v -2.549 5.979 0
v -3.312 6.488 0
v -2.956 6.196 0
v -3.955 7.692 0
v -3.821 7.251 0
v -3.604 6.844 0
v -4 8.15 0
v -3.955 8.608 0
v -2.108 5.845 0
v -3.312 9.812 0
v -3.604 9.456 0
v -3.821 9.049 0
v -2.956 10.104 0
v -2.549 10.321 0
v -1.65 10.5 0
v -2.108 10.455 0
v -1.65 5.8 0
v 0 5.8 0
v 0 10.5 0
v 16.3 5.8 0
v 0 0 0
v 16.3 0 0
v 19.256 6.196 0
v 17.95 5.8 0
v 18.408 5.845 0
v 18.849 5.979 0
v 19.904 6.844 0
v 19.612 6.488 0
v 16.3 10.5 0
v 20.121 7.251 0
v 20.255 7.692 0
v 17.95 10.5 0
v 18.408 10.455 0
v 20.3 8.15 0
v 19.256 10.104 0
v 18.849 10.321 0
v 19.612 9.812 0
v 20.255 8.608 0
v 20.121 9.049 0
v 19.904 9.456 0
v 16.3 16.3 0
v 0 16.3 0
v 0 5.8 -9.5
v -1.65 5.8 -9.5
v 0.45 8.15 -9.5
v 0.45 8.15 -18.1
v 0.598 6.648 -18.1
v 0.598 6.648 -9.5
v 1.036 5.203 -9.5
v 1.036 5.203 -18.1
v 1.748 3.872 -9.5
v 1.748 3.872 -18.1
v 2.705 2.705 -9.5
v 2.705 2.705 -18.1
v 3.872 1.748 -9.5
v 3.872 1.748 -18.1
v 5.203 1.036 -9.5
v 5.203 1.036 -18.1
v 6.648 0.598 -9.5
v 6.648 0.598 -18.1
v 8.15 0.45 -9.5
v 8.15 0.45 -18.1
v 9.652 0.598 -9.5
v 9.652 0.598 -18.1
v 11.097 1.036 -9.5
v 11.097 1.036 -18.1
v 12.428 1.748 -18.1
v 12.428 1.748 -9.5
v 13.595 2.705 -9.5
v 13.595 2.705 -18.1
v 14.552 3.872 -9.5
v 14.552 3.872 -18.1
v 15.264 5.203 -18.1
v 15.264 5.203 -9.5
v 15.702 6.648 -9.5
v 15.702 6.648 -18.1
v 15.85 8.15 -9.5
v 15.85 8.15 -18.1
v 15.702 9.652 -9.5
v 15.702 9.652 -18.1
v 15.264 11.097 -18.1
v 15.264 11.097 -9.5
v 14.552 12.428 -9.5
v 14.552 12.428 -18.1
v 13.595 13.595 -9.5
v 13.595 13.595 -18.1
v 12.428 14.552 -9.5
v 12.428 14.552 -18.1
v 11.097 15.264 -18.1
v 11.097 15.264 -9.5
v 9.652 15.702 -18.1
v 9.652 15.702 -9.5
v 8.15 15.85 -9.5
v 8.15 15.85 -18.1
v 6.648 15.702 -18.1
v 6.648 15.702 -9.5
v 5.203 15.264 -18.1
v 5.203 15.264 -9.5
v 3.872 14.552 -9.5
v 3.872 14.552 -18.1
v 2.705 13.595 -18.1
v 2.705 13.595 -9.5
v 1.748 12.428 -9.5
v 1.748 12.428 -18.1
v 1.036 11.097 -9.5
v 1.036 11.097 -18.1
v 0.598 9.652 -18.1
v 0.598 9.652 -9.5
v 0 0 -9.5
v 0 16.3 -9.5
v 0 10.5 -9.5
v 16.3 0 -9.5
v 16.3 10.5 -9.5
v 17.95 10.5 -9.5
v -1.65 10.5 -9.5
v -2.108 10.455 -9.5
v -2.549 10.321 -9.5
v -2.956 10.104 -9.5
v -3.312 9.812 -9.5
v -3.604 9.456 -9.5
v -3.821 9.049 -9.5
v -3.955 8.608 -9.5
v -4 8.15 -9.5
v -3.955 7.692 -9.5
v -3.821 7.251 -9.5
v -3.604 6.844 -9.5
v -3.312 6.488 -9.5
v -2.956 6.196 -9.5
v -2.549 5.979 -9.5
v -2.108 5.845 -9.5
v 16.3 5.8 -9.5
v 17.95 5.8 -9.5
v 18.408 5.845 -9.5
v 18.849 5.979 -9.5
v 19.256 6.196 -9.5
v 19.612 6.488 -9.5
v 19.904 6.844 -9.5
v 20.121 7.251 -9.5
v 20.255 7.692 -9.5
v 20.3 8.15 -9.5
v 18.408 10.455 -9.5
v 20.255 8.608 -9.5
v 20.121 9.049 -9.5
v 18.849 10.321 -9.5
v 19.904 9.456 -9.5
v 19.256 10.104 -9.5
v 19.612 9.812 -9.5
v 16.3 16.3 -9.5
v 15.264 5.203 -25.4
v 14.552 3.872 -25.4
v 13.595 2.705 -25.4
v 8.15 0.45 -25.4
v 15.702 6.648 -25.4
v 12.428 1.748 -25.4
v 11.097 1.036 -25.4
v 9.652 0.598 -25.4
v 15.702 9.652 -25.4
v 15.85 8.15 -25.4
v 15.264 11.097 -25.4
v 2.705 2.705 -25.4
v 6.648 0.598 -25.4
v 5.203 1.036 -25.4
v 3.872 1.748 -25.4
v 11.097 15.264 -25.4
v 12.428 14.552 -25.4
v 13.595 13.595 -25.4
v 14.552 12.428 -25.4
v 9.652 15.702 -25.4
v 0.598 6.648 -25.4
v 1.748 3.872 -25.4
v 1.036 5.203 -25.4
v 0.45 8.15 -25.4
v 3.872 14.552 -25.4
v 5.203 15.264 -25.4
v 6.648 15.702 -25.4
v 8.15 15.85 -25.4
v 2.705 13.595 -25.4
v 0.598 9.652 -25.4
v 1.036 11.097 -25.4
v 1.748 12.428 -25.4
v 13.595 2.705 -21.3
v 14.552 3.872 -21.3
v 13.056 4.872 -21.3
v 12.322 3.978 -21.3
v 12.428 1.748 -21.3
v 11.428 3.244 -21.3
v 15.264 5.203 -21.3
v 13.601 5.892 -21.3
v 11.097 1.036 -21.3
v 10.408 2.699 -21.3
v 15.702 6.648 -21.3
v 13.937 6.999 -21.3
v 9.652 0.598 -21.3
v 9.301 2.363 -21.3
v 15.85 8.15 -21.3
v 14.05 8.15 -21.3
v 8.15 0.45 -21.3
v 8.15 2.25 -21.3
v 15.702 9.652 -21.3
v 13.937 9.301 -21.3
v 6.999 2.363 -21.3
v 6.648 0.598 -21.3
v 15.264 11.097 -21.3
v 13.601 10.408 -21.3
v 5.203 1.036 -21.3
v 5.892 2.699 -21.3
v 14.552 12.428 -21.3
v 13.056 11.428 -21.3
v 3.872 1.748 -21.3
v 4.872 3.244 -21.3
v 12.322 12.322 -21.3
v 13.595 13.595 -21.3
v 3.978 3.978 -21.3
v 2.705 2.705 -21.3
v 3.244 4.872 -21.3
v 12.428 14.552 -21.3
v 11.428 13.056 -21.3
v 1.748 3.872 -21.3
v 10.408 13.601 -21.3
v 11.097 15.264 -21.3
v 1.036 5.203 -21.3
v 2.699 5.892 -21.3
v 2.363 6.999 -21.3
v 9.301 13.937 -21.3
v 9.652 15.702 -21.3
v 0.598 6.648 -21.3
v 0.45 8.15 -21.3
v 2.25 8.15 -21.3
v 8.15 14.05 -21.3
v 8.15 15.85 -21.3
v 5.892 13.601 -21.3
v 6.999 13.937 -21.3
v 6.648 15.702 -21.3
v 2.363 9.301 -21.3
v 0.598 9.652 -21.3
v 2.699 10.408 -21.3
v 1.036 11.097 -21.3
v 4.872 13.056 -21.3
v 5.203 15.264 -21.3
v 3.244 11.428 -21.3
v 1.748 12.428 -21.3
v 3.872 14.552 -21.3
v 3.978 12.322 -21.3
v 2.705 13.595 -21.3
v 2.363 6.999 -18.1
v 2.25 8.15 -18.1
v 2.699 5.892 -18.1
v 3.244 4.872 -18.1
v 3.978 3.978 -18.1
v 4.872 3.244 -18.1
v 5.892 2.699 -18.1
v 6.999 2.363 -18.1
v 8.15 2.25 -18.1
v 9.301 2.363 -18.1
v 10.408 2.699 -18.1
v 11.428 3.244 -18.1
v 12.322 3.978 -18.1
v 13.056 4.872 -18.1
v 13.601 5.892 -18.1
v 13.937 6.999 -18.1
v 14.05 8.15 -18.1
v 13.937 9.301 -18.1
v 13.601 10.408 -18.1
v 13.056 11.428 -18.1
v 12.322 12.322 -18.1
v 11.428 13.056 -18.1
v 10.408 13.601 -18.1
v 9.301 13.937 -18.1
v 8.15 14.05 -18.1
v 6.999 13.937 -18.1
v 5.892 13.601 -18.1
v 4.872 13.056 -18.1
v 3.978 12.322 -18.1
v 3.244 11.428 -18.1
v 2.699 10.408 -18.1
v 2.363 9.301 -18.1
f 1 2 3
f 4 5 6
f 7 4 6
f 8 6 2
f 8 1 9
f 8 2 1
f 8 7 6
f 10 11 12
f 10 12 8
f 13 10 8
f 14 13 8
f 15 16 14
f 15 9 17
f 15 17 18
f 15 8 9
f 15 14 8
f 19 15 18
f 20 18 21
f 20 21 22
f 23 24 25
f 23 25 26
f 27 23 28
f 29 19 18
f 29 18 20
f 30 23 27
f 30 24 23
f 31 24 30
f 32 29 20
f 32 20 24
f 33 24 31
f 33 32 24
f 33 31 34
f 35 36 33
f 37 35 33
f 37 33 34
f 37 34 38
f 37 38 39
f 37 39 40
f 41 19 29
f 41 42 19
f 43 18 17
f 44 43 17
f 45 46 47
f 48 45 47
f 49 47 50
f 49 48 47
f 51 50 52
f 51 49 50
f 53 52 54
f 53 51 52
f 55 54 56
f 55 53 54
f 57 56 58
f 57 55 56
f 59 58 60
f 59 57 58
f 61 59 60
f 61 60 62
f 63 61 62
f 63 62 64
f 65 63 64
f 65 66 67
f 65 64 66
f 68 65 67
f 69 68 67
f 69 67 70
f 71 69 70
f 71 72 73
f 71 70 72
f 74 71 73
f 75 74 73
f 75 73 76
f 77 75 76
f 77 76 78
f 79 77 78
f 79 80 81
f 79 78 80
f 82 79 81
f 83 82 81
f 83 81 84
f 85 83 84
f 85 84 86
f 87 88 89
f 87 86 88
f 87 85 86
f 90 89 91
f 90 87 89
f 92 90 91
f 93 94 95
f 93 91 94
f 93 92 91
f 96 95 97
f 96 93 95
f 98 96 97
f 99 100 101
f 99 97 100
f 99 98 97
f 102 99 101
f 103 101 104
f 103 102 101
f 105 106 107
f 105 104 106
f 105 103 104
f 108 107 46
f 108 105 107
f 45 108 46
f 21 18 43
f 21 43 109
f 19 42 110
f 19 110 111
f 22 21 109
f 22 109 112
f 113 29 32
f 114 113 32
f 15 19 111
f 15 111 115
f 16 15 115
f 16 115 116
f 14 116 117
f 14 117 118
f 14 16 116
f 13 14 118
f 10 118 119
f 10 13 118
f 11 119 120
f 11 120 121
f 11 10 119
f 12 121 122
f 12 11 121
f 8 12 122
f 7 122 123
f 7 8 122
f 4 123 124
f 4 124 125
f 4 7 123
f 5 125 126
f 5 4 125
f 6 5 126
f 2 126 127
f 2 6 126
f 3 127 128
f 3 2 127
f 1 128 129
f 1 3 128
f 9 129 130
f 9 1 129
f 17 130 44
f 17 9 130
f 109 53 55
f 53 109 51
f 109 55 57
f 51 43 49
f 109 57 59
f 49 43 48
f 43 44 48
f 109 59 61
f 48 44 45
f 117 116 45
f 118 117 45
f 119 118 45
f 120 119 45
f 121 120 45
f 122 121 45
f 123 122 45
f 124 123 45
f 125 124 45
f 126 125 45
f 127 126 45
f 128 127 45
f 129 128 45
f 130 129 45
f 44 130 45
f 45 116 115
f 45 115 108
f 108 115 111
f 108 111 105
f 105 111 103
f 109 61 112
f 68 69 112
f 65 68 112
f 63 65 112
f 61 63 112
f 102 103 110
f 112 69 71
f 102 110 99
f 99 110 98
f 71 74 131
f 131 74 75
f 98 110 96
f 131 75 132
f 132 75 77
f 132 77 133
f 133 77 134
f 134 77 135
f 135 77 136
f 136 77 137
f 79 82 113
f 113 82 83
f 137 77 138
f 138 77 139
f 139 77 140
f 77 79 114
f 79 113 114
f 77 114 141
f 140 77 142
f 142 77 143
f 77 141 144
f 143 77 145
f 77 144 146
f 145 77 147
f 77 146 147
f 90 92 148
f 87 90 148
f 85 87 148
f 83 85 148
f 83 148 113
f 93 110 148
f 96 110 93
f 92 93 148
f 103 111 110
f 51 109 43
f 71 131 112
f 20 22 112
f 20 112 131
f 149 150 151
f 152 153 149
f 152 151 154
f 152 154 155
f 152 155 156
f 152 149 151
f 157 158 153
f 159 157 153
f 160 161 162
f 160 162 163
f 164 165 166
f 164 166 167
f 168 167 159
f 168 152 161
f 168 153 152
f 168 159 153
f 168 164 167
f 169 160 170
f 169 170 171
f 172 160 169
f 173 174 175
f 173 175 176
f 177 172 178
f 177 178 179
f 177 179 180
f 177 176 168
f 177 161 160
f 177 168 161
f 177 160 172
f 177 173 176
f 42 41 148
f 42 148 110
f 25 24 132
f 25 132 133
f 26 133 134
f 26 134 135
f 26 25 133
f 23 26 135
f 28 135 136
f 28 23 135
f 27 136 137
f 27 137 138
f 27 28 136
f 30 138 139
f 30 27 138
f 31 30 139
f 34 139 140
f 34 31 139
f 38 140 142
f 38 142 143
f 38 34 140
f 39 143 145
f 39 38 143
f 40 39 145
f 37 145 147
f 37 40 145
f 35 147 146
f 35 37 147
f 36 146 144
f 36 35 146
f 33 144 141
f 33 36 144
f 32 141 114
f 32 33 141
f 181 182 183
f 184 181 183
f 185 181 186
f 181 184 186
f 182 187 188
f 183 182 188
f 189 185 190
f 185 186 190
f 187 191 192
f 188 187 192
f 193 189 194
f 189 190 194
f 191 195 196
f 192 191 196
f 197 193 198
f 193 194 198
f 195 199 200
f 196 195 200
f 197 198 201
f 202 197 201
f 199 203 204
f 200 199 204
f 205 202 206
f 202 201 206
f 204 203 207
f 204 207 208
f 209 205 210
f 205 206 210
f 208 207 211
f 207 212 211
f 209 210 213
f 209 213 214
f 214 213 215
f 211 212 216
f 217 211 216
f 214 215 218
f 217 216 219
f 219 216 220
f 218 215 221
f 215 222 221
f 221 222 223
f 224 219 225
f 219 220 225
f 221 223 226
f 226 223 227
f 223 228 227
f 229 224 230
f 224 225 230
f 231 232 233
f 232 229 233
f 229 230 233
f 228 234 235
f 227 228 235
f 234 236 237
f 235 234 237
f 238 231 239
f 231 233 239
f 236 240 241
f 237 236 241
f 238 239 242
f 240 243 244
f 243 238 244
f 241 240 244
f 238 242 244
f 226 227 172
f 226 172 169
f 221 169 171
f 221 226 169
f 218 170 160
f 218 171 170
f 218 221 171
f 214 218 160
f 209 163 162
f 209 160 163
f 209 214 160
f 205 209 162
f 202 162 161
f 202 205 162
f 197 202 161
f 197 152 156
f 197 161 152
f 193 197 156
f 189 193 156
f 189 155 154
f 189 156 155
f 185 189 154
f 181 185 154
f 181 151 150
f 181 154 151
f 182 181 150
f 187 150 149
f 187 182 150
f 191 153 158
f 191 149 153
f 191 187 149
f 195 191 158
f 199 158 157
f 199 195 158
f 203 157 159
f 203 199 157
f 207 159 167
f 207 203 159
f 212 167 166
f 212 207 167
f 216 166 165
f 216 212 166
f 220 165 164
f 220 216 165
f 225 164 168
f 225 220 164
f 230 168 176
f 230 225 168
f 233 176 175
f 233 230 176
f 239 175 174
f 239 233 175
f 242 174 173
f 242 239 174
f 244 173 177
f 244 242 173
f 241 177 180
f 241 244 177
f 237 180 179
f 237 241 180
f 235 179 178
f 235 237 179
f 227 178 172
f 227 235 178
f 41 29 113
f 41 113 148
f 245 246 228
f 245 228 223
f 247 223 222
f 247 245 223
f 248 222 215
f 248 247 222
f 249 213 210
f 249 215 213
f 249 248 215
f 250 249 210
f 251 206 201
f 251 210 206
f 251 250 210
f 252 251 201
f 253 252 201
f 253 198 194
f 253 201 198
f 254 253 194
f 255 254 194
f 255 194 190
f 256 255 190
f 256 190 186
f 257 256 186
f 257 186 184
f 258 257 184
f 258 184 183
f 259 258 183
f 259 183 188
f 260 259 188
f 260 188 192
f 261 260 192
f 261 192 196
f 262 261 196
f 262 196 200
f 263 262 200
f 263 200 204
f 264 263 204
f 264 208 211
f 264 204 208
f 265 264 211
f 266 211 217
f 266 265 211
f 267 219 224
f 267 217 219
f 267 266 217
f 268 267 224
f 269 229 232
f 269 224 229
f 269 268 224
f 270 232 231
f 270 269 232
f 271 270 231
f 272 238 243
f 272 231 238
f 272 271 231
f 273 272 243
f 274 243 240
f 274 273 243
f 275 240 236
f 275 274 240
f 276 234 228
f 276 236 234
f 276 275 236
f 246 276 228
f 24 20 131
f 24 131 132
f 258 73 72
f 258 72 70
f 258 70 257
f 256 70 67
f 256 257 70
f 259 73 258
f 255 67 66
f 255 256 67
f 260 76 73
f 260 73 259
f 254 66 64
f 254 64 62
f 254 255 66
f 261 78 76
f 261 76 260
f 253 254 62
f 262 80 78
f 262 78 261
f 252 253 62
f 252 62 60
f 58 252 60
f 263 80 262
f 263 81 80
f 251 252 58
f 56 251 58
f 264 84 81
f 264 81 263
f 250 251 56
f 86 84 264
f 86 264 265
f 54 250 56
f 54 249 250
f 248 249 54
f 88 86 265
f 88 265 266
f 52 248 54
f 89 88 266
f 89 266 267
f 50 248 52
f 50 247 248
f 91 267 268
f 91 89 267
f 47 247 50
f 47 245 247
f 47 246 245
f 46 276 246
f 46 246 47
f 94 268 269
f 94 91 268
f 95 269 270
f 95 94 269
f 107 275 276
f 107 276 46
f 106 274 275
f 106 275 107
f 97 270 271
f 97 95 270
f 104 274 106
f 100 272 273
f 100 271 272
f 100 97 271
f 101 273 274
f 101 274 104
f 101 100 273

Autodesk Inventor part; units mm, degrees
ref_plane "YZ Plane" through (0, 0, 0) normal (1, 0, 0) x (0, 1, 0)
ref_plane "XZ Plane" through (0, 0, 0) normal (0, 1, 0) x (-1, 0, 0)
ref_plane "XY Plane" through (0, 0, 0) normal (0, 0, 1) x (1, 0, 0)
sketch "Эскиз1" plane through (0, 0, 0) normal (0, 0, 1) x (1, 0, 0)
  line L0 (0, 0) -> (16.3, 0)
  line L1 (16.3, 16.3) -> (0, 16.3)
  line L2 (0, 10.5) -> (-1.65, 10.5)
  line L3 (0, 5.8) -> (-1.65, 5.8)
  line L4 (16.3, 10.5) -> (17.95, 10.5)
  line L5 (16.3, 5.8) -> (17.95, 5.8)
  arc A0 (-1.65, 10.5) -> (-1.65, 5.8) centre (-1.65, 8.15) ccw
  arc A1 (17.95, 5.8) -> (17.95, 10.5) centre (17.95, 8.15) ccw
  line L6 (0, 16.3) -> (0, 10.5)
  line L7 (0, 5.8) -> (0, 0)
  line L8 (16.3, 0) -> (16.3, 5.8)
  line L9 (16.3, 10.5) -> (16.3, 16.3)
  point P0 (-4, 8.15)
  dimension "d0" = 4.7
  dimension "d1" = 4
  dimension "d2" = 16.3
  dimension "d3" = 16.3
  dimension "d4" = 4.7
extrude "Выдавливание1" add sketch "Эскиз1" against normal blind 9.5
sketch "Эскиз2" plane through (0, 0, -9.5) normal (0, 0, -1) x (-1, 0, 0)
  circle A0 centre (-8.15, 8.15) radius 7.7
  arc A1 (1.65, 5.8) -> (1.65, 10.5) centre (1.65, 8.15) ccw projected
  line L0 (0, 16.3) -> (-16.3, 16.3) projected
  point P0 (0, 0)
  point P1 (4, 8.15)
  point P2 (-8.15, 16.3)
  dimension "d7" = 15.4
extrude "Выдавливание2" add sketch "Эскиз2" along normal blind 8.6
sketch "Эскиз3" plane through (8.15, 8.15, -18.1) normal (0, 0, -1) x (-1, 0, 0)
  circle A0 centre (0, 0) radius 5.9
  dimension "d10" = 11.8
extrude "Выдавливание3" add sketch "Эскиз3" along normal blind 3.2
sketch "Эскиз4" plane through (8.15, 8.15, -21.3) normal (0, 0, -1) x (-1, 0, 0)
  circle A0 centre (0, 0) radius 7.7 projected
extrude "Выдавливание4" add sketch "Эскиз4" along normal blind 4.1
equation "\"d4\" = d0"
properties part number "cum"
